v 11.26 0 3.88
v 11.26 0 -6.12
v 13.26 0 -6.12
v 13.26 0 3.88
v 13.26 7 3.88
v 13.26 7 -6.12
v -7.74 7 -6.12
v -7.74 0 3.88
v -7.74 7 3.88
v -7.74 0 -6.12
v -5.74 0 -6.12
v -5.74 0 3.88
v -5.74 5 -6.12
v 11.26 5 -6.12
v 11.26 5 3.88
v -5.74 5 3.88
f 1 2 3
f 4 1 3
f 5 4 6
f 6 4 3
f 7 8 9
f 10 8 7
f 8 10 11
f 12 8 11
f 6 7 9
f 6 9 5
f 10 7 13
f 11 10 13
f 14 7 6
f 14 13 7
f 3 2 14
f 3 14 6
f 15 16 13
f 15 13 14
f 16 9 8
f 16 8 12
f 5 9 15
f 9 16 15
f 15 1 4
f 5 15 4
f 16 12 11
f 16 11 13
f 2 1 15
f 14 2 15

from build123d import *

# Parameters (mm, degrees)
SKETCH1_W           = 21
SKETCH1_H           = 10
BOSS_EXTRUDE1_DEPTH = 7
SKETCH2_W           = 17
SKETCH2_H           = 5
CUT_EXTRUDE1_DEPTH  = 10


with BuildPart() as part:
    # Sketch1 → Boss-Extrude1 (new body)
    with BuildSketch(Plane(origin=(0, 0, 0), x_dir=(1, 0, 0), z_dir=(0, 1, 0))):
        with Locations((2.759910232, 1.119822485)):
            Rectangle(SKETCH1_W, SKETCH1_H)
    extrude(amount=BOSS_EXTRUDE1_DEPTH)

    # Sketch2 → Cut-Extrude1 (cut)
    with BuildSketch(Plane.XY.offset(3.880177515)):
        with Locations((2.759910232, 2.5)):
            Rectangle(SKETCH2_W, SKETCH2_H)
    extrude(amount=-CUT_EXTRUDE1_DEPTH, mode=Mode.SUBTRACT)


solid = part.part
